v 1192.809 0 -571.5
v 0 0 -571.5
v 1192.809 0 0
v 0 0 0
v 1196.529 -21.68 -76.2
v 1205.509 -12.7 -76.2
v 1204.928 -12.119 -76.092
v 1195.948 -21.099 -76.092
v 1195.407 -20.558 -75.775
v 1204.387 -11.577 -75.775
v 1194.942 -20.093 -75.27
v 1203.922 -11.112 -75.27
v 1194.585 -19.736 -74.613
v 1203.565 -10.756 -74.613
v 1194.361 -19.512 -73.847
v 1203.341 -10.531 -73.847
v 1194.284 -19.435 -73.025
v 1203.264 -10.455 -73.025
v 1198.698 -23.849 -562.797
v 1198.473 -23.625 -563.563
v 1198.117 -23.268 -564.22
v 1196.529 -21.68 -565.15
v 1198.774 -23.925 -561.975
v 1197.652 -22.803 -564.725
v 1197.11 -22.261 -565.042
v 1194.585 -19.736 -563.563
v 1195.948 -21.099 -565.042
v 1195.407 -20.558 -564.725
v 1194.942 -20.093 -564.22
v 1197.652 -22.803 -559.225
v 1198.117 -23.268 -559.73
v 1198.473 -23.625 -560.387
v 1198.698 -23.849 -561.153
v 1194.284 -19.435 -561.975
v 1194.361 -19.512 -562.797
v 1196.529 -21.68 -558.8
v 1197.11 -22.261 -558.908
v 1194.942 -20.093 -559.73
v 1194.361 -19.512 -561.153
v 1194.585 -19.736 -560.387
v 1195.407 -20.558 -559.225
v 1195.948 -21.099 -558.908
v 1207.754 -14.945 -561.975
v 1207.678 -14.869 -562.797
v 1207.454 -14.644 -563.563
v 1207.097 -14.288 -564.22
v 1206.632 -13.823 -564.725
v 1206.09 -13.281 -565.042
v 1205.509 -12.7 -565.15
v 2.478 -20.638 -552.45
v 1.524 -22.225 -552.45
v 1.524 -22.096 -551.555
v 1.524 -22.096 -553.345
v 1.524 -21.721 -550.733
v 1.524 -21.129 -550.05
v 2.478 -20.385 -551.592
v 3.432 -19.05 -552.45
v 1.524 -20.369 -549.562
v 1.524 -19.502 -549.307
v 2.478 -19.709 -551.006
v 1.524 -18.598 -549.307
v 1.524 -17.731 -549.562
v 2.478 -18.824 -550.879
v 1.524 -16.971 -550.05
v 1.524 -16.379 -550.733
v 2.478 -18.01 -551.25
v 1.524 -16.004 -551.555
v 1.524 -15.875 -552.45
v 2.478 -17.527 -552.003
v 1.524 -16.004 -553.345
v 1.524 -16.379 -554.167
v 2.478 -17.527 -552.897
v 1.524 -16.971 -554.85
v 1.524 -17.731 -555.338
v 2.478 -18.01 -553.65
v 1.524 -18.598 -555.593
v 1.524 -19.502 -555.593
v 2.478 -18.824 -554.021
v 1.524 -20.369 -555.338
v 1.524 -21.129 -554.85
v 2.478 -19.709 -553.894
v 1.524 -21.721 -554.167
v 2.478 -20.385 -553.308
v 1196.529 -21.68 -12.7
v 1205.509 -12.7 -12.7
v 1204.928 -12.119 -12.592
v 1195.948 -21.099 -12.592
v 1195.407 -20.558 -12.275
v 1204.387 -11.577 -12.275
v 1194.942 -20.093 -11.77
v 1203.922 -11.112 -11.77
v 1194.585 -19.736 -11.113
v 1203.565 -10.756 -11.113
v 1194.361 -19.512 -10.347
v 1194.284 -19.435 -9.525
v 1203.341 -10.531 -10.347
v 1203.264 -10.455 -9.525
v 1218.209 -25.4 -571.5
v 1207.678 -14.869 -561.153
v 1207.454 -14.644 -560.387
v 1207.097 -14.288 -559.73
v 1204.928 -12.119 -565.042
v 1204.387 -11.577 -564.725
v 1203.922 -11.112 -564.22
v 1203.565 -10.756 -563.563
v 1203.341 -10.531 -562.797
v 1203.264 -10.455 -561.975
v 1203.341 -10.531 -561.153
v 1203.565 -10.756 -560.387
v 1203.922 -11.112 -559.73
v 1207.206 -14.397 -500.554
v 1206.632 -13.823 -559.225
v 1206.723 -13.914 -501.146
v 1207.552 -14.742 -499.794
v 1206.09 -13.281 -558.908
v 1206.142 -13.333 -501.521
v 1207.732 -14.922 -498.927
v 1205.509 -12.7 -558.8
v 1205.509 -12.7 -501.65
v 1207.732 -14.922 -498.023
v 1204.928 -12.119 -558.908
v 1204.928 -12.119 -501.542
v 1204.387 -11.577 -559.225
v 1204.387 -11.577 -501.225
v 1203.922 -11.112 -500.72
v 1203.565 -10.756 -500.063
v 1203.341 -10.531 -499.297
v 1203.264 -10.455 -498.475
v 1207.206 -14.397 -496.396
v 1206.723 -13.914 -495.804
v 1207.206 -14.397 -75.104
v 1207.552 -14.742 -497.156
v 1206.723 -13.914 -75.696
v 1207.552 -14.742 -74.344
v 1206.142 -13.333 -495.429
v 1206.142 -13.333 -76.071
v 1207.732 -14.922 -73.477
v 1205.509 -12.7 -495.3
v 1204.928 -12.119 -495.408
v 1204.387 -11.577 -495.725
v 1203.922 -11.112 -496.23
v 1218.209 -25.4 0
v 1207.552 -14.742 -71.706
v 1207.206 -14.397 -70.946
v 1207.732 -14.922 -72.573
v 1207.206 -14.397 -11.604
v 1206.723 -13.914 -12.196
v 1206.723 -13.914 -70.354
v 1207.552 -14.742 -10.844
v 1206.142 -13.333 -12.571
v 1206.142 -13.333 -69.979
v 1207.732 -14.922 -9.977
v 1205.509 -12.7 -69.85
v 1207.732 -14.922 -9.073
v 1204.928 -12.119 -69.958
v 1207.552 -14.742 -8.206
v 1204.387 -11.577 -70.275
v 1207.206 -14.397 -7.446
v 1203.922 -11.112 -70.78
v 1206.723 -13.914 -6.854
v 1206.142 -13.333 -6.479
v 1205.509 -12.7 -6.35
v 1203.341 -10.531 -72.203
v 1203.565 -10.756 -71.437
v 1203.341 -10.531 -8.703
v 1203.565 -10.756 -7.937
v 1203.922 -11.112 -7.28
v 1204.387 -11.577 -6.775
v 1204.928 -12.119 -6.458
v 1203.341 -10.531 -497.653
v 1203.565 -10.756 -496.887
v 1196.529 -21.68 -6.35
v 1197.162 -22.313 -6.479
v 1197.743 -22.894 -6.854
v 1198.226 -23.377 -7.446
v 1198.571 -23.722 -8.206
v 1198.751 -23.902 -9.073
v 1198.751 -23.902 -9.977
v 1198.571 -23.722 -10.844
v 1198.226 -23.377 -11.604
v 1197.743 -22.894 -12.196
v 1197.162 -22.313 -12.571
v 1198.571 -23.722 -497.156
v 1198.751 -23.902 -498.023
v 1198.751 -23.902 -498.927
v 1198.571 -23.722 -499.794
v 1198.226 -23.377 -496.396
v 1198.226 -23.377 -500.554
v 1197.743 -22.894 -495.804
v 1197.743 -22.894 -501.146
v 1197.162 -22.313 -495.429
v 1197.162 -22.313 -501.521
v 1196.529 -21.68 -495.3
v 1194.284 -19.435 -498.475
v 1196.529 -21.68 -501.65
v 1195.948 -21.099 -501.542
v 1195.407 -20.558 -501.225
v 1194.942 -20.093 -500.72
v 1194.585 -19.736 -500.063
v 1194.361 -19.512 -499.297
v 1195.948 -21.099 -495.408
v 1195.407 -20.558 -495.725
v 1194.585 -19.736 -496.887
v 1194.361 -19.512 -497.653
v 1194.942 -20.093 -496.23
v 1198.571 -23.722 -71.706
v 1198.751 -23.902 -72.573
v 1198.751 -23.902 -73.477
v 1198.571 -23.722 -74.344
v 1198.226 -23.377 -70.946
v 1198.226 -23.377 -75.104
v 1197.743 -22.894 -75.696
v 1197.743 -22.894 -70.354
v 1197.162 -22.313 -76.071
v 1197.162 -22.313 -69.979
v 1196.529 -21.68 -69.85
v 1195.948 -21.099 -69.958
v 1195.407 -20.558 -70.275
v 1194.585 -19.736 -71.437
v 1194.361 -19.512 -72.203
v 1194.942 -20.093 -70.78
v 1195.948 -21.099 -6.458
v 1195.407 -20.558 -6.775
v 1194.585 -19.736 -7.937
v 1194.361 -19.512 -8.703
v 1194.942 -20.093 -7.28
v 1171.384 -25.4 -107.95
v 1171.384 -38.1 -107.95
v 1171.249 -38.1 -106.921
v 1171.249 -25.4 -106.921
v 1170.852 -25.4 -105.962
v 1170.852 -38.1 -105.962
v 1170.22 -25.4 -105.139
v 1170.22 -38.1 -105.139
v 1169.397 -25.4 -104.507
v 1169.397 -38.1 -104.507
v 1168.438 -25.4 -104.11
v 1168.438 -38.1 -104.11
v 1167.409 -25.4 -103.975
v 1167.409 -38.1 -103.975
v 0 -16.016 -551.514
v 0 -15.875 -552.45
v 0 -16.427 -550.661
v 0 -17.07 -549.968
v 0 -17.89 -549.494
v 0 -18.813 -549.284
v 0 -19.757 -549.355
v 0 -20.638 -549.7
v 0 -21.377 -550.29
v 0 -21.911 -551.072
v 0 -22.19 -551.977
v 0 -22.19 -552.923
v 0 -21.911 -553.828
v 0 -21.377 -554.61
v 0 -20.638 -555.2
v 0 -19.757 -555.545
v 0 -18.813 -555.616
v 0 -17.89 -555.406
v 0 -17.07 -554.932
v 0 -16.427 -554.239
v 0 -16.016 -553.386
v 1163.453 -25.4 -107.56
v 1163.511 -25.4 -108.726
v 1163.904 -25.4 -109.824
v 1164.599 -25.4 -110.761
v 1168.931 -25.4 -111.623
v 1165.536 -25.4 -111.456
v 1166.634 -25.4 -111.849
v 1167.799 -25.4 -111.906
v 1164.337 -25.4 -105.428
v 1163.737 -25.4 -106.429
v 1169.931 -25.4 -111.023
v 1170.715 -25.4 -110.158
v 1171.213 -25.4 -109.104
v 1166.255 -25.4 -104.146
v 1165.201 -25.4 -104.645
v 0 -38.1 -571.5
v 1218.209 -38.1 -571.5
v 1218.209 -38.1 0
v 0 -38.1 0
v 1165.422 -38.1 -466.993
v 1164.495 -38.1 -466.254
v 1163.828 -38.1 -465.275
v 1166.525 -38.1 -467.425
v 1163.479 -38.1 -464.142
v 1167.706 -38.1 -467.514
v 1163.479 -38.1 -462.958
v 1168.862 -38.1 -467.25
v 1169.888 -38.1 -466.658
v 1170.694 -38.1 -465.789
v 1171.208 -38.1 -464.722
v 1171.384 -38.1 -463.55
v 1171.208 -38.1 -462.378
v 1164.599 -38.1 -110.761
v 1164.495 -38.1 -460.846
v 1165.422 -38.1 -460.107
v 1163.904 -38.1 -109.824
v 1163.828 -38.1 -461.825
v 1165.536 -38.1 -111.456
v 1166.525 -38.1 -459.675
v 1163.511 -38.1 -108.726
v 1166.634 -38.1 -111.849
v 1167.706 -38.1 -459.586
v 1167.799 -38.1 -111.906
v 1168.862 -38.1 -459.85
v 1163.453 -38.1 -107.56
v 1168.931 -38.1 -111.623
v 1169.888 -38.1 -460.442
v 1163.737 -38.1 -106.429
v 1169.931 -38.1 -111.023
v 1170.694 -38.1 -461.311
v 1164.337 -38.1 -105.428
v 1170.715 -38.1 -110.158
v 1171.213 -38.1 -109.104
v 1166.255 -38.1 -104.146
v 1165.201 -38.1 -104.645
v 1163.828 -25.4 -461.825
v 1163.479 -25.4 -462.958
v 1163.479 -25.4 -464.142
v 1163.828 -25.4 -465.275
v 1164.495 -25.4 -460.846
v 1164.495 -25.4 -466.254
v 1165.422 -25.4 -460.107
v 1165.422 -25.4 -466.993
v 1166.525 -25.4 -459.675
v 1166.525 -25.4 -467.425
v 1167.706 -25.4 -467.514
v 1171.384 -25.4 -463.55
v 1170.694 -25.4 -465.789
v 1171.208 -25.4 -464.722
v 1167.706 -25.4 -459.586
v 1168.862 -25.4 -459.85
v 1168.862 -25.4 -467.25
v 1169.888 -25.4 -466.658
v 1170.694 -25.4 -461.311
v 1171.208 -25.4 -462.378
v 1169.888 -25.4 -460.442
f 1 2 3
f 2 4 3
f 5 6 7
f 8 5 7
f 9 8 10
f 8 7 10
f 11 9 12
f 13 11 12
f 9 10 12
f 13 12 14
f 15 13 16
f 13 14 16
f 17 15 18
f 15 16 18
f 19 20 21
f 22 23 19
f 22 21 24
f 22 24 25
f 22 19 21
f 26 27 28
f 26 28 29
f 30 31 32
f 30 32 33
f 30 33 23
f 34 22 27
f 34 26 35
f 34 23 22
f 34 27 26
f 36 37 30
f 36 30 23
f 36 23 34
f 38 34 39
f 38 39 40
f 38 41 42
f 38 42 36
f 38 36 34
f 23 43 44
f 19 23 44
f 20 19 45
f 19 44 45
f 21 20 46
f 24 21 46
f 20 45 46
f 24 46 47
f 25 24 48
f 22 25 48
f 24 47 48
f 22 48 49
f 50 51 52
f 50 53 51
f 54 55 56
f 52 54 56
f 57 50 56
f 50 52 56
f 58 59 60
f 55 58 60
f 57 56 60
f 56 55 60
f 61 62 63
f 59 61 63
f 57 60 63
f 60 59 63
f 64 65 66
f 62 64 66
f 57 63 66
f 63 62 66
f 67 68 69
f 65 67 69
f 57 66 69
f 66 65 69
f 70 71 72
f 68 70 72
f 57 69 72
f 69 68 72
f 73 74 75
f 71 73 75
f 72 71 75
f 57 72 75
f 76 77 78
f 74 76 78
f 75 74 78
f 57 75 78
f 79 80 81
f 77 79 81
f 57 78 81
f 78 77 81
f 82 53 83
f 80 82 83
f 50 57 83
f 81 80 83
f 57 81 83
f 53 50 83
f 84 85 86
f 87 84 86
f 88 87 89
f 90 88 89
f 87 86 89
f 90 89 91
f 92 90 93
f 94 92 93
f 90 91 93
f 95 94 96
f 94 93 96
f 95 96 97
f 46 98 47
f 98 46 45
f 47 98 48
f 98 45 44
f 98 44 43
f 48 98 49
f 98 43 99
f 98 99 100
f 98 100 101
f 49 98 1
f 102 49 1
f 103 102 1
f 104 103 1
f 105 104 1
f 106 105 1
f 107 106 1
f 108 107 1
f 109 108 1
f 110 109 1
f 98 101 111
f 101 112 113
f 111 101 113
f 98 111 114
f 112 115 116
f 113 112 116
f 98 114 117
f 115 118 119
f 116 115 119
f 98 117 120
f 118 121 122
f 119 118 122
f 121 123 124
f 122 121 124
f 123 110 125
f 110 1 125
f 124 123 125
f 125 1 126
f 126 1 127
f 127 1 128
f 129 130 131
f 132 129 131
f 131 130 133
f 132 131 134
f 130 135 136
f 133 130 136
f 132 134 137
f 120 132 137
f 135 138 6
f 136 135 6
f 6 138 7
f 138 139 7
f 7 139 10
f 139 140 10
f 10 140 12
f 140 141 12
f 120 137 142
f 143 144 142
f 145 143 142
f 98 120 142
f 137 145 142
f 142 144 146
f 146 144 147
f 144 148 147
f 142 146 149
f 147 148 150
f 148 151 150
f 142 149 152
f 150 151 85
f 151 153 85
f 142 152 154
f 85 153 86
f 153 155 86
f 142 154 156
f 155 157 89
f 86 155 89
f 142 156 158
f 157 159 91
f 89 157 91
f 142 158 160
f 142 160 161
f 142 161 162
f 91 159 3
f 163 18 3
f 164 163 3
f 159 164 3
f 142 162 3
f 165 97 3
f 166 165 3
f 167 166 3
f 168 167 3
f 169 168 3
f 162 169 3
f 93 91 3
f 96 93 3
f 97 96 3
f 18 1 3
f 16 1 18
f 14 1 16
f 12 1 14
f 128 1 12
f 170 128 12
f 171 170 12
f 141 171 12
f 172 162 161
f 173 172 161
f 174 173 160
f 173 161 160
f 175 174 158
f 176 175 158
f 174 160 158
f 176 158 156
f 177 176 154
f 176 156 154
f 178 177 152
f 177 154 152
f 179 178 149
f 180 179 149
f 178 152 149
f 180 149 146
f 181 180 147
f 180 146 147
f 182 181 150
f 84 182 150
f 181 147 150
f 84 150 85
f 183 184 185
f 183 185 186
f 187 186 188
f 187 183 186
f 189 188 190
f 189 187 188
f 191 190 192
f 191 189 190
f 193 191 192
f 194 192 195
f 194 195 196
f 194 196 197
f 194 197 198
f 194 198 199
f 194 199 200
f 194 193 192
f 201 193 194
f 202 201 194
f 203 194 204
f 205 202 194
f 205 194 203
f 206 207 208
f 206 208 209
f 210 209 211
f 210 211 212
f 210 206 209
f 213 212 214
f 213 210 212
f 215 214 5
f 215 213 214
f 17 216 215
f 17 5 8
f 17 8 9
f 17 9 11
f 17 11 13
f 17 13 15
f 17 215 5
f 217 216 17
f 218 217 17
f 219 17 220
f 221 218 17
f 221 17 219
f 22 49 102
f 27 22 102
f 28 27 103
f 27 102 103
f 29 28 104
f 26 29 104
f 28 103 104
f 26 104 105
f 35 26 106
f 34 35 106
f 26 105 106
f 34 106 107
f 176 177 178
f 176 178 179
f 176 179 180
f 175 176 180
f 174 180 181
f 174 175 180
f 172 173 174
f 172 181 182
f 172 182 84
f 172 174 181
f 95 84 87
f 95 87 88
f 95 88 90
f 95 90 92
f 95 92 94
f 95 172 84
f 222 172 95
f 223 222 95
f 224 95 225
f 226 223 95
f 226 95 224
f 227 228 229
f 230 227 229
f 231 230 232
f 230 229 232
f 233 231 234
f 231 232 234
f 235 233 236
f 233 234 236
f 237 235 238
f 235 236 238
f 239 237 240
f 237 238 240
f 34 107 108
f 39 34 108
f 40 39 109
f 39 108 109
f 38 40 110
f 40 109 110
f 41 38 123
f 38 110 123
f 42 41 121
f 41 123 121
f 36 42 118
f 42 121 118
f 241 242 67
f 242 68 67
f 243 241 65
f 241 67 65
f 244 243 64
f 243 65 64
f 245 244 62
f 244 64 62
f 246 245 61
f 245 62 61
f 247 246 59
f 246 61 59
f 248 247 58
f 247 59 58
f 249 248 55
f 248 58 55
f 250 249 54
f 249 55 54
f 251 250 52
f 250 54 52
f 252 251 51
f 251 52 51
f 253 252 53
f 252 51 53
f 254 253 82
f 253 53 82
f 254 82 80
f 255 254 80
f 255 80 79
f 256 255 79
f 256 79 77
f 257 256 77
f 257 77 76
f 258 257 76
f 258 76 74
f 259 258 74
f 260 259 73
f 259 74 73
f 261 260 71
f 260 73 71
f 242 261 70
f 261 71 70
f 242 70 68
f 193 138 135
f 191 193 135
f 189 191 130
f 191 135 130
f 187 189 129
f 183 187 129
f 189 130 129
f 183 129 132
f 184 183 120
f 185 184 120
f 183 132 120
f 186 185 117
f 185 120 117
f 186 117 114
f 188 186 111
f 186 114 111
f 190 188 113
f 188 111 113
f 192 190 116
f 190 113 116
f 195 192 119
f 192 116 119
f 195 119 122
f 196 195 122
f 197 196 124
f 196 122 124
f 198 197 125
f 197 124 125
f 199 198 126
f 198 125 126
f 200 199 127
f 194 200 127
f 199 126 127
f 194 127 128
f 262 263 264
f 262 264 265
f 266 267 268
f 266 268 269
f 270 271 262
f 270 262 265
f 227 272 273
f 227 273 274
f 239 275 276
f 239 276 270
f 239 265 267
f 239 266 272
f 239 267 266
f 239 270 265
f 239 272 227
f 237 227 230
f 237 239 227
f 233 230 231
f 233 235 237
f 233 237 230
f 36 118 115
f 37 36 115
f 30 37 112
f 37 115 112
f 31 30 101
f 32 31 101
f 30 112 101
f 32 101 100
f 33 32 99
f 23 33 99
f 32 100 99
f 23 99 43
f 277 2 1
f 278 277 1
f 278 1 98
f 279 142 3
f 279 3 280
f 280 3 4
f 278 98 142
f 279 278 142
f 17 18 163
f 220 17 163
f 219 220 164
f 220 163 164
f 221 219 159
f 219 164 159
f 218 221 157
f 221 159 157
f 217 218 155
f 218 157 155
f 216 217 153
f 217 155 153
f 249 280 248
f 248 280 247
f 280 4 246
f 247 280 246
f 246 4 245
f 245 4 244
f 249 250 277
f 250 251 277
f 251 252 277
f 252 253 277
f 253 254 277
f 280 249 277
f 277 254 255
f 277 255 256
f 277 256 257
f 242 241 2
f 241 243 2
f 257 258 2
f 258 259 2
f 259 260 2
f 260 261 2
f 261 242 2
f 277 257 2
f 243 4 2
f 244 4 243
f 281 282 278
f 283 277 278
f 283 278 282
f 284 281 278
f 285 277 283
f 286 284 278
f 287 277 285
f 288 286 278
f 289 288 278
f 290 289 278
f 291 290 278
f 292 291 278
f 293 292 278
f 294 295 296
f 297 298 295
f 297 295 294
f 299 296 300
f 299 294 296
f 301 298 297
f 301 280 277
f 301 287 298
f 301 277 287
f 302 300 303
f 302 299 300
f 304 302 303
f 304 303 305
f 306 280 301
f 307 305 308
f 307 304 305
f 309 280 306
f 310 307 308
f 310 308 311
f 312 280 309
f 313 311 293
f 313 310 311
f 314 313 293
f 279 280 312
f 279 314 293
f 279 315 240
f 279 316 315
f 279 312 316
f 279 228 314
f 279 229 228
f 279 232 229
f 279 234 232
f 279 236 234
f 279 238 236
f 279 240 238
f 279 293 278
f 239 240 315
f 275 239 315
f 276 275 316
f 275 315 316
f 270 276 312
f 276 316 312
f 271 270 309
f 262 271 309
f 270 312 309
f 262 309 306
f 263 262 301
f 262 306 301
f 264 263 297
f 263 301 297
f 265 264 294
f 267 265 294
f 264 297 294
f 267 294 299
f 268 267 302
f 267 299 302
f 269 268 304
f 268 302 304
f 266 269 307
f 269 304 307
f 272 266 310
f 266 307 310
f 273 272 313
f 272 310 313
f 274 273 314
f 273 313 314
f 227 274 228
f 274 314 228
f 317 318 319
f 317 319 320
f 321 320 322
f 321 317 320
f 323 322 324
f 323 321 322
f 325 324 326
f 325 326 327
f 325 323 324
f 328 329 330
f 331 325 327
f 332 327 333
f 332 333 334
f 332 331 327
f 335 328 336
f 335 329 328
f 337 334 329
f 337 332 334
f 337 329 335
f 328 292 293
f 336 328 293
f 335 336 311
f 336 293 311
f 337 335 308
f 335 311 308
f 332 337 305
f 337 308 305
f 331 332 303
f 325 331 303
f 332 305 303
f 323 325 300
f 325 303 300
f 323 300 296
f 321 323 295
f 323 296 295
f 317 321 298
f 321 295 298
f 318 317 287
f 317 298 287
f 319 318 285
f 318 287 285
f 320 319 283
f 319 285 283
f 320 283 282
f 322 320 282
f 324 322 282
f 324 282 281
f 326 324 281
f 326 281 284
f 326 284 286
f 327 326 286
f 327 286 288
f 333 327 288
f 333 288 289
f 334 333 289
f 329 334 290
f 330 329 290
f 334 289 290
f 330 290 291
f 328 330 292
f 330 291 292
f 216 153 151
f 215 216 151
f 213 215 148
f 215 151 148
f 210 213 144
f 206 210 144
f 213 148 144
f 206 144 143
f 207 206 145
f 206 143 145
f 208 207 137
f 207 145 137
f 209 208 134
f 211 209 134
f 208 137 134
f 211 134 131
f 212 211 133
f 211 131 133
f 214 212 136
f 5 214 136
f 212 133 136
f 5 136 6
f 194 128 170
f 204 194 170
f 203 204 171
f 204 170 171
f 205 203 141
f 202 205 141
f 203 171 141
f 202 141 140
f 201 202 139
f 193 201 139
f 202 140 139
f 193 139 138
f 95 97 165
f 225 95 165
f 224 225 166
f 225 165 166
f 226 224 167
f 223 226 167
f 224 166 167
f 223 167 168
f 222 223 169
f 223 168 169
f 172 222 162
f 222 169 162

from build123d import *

# Parameters (mm, degrees)
F1_DEPTH = 38.1
F3_D     = 6.35
F3_DEPTH = 1.524
F3_TIP   = 1.9077324654
F4_SIZE2 = 25.4
F4_SIZE  = 25.4
F6_DEPTH = 12.7
F7_R     = 3.9751
F8_DEPTH = 12.7


with BuildPart() as f1:
    # F0 (on Front) → F1 (new body)
    with BuildSketch(Plane.XZ):
        Polygon((0, -6.35), (0, -571.5), (1218.2094, -571.5), (1218.2094, -6.35), (1218.2094, 0), (0, 0), align=None)
    extrude(amount=F1_DEPTH)

    # F3
    with Locations(Plane(origin=(0, 0, 0), x_dir=(0, -1, 0), z_dir=(-1, 0, 0))):
        with Locations((19.05, -552.45), (19.05, -590.55)):
            Hole(F3_D / 2, depth=F3_DEPTH)
            with Locations((0, 0, -(F3_DEPTH + F3_TIP / 2))):  # 118° drill point
                Cone(0, F3_D / 2, F3_TIP, mode=Mode.SUBTRACT)

    # F4
    f4_edges = [f1.edges().sort_by_distance(p)[0] for p in [
        (1218.2094, 0, -285.75),
    ]]
    chamfer(f4_edges, length=F4_SIZE, length2=F4_SIZE2)

    # F5 (on face) → F6 (cut)
    with BuildSketch(Plane(origin=(596.4047, 596.4047, 0), x_dir=(-0.7071067812, 0.7071067812, 0), z_dir=(0.7071067812, 0.7071067812, 0))):
        with BuildLine():
            ThreePointArc((-864.5791276452, -561.975), (-863.6491916755, -564.2200640303), (-861.4041276452, -565.15))
            Line((-861.4041276452, -565.15), (-861.4041276452, -561.975))
            Line((-861.4041276452, -561.975), (-864.5791276452, -561.975))
        make_face()
        with BuildLine():
            ThreePointArc((-861.4041276452, -6.35), (-864.5791276452, -9.525), (-861.4041276452, -12.7))
            Line((-861.4041276452, -12.7), (-861.4041276452, -6.35))
        make_face()
        with BuildLine():
            Line((-861.4041276452, -6.35), (-861.4041276452, -12.7))
            ThreePointArc((-861.4041276452, -12.7), (-859.1590636149, -11.7700640303), (-858.2291276452, -9.525))
            ThreePointArc((-858.2291276452, -9.525), (-859.1590636149, -7.2799359697), (-861.4041276452, -6.35))
        make_face()
        with BuildLine():
            ThreePointArc((-861.4041276452, -69.85), (-864.5791276452, -73.025), (-861.4041276452, -76.2))
            Line((-861.4041276452, -76.2), (-861.4041276452, -69.85))
        make_face()
        with BuildLine():
            Line((-861.4041276452, -69.85), (-861.4041276452, -76.2))
            ThreePointArc((-861.4041276452, -76.2), (-859.1590636149, -75.2700640303), (-858.2291276452, -73.025))
            ThreePointArc((-858.2291276452, -73.025), (-859.1590636149, -70.7799359697), (-861.4041276452, -69.85))
        make_face()
        with BuildLine():
            ThreePointArc((-861.4041276452, -495.3), (-864.5791276452, -498.475), (-861.4041276452, -501.65))
            Line((-861.4041276452, -501.65), (-861.4041276452, -498.475))
            Line((-861.4041276452, -498.475), (-861.4041276452, -495.3))
        make_face()
        with BuildLine():
            Line((-861.4041276452, -498.475), (-861.4041276452, -501.65))
            ThreePointArc((-861.4041276452, -501.65), (-859.1590636149, -500.7200640303), (-858.2291276452, -498.475))
            ThreePointArc((-858.2291276452, -498.475), (-859.1590636149, -496.2299359697), (-861.4041276452, -495.3))
            Line((-861.4041276452, -495.3), (-861.4041276452, -498.475))
        make_face()
        with BuildLine():
            Line((-861.4041276452, -561.975), (-861.4041276452, -565.15))
            ThreePointArc((-861.4041276452, -565.15), (-859.1590636149, -564.2200640303), (-858.2291276452, -561.975))
            ThreePointArc((-858.2291276452, -561.975), (-859.1590636149, -559.7299359697), (-861.4041276452, -558.8))
            Line((-861.4041276452, -558.8), (-861.4041276452, -561.975))
        make_face()
        with BuildLine():
            Line((-864.5791276452, -561.975), (-861.4041276452, -561.975))
            Line((-861.4041276452, -561.975), (-861.4041276452, -558.8))
            ThreePointArc((-861.4041276452, -558.8), (-863.6491916755, -559.7299359697), (-864.5791276452, -561.975))
        make_face()
    extrude(amount=-F6_DEPTH, mode=Mode.SUBTRACT)

    # F7 (on face) → F8 (cut)
    with BuildSketch(Plane.XZ.offset(38.1)):
        with BuildLine():
            ThreePointArc((1167.4094, -103.9749), (1164.5985798341, -110.7608201659), (1171.3845, -107.95))
            ThreePointArc((1171.3845, -107.95), (1170.2202201659, -105.1391798341), (1167.4094, -103.9749))
        make_face()
        with Locations((1167.4094, -463.55)):
            Circle(F7_R)
    extrude(amount=-F8_DEPTH, mode=Mode.SUBTRACT)


solid = f1.part
